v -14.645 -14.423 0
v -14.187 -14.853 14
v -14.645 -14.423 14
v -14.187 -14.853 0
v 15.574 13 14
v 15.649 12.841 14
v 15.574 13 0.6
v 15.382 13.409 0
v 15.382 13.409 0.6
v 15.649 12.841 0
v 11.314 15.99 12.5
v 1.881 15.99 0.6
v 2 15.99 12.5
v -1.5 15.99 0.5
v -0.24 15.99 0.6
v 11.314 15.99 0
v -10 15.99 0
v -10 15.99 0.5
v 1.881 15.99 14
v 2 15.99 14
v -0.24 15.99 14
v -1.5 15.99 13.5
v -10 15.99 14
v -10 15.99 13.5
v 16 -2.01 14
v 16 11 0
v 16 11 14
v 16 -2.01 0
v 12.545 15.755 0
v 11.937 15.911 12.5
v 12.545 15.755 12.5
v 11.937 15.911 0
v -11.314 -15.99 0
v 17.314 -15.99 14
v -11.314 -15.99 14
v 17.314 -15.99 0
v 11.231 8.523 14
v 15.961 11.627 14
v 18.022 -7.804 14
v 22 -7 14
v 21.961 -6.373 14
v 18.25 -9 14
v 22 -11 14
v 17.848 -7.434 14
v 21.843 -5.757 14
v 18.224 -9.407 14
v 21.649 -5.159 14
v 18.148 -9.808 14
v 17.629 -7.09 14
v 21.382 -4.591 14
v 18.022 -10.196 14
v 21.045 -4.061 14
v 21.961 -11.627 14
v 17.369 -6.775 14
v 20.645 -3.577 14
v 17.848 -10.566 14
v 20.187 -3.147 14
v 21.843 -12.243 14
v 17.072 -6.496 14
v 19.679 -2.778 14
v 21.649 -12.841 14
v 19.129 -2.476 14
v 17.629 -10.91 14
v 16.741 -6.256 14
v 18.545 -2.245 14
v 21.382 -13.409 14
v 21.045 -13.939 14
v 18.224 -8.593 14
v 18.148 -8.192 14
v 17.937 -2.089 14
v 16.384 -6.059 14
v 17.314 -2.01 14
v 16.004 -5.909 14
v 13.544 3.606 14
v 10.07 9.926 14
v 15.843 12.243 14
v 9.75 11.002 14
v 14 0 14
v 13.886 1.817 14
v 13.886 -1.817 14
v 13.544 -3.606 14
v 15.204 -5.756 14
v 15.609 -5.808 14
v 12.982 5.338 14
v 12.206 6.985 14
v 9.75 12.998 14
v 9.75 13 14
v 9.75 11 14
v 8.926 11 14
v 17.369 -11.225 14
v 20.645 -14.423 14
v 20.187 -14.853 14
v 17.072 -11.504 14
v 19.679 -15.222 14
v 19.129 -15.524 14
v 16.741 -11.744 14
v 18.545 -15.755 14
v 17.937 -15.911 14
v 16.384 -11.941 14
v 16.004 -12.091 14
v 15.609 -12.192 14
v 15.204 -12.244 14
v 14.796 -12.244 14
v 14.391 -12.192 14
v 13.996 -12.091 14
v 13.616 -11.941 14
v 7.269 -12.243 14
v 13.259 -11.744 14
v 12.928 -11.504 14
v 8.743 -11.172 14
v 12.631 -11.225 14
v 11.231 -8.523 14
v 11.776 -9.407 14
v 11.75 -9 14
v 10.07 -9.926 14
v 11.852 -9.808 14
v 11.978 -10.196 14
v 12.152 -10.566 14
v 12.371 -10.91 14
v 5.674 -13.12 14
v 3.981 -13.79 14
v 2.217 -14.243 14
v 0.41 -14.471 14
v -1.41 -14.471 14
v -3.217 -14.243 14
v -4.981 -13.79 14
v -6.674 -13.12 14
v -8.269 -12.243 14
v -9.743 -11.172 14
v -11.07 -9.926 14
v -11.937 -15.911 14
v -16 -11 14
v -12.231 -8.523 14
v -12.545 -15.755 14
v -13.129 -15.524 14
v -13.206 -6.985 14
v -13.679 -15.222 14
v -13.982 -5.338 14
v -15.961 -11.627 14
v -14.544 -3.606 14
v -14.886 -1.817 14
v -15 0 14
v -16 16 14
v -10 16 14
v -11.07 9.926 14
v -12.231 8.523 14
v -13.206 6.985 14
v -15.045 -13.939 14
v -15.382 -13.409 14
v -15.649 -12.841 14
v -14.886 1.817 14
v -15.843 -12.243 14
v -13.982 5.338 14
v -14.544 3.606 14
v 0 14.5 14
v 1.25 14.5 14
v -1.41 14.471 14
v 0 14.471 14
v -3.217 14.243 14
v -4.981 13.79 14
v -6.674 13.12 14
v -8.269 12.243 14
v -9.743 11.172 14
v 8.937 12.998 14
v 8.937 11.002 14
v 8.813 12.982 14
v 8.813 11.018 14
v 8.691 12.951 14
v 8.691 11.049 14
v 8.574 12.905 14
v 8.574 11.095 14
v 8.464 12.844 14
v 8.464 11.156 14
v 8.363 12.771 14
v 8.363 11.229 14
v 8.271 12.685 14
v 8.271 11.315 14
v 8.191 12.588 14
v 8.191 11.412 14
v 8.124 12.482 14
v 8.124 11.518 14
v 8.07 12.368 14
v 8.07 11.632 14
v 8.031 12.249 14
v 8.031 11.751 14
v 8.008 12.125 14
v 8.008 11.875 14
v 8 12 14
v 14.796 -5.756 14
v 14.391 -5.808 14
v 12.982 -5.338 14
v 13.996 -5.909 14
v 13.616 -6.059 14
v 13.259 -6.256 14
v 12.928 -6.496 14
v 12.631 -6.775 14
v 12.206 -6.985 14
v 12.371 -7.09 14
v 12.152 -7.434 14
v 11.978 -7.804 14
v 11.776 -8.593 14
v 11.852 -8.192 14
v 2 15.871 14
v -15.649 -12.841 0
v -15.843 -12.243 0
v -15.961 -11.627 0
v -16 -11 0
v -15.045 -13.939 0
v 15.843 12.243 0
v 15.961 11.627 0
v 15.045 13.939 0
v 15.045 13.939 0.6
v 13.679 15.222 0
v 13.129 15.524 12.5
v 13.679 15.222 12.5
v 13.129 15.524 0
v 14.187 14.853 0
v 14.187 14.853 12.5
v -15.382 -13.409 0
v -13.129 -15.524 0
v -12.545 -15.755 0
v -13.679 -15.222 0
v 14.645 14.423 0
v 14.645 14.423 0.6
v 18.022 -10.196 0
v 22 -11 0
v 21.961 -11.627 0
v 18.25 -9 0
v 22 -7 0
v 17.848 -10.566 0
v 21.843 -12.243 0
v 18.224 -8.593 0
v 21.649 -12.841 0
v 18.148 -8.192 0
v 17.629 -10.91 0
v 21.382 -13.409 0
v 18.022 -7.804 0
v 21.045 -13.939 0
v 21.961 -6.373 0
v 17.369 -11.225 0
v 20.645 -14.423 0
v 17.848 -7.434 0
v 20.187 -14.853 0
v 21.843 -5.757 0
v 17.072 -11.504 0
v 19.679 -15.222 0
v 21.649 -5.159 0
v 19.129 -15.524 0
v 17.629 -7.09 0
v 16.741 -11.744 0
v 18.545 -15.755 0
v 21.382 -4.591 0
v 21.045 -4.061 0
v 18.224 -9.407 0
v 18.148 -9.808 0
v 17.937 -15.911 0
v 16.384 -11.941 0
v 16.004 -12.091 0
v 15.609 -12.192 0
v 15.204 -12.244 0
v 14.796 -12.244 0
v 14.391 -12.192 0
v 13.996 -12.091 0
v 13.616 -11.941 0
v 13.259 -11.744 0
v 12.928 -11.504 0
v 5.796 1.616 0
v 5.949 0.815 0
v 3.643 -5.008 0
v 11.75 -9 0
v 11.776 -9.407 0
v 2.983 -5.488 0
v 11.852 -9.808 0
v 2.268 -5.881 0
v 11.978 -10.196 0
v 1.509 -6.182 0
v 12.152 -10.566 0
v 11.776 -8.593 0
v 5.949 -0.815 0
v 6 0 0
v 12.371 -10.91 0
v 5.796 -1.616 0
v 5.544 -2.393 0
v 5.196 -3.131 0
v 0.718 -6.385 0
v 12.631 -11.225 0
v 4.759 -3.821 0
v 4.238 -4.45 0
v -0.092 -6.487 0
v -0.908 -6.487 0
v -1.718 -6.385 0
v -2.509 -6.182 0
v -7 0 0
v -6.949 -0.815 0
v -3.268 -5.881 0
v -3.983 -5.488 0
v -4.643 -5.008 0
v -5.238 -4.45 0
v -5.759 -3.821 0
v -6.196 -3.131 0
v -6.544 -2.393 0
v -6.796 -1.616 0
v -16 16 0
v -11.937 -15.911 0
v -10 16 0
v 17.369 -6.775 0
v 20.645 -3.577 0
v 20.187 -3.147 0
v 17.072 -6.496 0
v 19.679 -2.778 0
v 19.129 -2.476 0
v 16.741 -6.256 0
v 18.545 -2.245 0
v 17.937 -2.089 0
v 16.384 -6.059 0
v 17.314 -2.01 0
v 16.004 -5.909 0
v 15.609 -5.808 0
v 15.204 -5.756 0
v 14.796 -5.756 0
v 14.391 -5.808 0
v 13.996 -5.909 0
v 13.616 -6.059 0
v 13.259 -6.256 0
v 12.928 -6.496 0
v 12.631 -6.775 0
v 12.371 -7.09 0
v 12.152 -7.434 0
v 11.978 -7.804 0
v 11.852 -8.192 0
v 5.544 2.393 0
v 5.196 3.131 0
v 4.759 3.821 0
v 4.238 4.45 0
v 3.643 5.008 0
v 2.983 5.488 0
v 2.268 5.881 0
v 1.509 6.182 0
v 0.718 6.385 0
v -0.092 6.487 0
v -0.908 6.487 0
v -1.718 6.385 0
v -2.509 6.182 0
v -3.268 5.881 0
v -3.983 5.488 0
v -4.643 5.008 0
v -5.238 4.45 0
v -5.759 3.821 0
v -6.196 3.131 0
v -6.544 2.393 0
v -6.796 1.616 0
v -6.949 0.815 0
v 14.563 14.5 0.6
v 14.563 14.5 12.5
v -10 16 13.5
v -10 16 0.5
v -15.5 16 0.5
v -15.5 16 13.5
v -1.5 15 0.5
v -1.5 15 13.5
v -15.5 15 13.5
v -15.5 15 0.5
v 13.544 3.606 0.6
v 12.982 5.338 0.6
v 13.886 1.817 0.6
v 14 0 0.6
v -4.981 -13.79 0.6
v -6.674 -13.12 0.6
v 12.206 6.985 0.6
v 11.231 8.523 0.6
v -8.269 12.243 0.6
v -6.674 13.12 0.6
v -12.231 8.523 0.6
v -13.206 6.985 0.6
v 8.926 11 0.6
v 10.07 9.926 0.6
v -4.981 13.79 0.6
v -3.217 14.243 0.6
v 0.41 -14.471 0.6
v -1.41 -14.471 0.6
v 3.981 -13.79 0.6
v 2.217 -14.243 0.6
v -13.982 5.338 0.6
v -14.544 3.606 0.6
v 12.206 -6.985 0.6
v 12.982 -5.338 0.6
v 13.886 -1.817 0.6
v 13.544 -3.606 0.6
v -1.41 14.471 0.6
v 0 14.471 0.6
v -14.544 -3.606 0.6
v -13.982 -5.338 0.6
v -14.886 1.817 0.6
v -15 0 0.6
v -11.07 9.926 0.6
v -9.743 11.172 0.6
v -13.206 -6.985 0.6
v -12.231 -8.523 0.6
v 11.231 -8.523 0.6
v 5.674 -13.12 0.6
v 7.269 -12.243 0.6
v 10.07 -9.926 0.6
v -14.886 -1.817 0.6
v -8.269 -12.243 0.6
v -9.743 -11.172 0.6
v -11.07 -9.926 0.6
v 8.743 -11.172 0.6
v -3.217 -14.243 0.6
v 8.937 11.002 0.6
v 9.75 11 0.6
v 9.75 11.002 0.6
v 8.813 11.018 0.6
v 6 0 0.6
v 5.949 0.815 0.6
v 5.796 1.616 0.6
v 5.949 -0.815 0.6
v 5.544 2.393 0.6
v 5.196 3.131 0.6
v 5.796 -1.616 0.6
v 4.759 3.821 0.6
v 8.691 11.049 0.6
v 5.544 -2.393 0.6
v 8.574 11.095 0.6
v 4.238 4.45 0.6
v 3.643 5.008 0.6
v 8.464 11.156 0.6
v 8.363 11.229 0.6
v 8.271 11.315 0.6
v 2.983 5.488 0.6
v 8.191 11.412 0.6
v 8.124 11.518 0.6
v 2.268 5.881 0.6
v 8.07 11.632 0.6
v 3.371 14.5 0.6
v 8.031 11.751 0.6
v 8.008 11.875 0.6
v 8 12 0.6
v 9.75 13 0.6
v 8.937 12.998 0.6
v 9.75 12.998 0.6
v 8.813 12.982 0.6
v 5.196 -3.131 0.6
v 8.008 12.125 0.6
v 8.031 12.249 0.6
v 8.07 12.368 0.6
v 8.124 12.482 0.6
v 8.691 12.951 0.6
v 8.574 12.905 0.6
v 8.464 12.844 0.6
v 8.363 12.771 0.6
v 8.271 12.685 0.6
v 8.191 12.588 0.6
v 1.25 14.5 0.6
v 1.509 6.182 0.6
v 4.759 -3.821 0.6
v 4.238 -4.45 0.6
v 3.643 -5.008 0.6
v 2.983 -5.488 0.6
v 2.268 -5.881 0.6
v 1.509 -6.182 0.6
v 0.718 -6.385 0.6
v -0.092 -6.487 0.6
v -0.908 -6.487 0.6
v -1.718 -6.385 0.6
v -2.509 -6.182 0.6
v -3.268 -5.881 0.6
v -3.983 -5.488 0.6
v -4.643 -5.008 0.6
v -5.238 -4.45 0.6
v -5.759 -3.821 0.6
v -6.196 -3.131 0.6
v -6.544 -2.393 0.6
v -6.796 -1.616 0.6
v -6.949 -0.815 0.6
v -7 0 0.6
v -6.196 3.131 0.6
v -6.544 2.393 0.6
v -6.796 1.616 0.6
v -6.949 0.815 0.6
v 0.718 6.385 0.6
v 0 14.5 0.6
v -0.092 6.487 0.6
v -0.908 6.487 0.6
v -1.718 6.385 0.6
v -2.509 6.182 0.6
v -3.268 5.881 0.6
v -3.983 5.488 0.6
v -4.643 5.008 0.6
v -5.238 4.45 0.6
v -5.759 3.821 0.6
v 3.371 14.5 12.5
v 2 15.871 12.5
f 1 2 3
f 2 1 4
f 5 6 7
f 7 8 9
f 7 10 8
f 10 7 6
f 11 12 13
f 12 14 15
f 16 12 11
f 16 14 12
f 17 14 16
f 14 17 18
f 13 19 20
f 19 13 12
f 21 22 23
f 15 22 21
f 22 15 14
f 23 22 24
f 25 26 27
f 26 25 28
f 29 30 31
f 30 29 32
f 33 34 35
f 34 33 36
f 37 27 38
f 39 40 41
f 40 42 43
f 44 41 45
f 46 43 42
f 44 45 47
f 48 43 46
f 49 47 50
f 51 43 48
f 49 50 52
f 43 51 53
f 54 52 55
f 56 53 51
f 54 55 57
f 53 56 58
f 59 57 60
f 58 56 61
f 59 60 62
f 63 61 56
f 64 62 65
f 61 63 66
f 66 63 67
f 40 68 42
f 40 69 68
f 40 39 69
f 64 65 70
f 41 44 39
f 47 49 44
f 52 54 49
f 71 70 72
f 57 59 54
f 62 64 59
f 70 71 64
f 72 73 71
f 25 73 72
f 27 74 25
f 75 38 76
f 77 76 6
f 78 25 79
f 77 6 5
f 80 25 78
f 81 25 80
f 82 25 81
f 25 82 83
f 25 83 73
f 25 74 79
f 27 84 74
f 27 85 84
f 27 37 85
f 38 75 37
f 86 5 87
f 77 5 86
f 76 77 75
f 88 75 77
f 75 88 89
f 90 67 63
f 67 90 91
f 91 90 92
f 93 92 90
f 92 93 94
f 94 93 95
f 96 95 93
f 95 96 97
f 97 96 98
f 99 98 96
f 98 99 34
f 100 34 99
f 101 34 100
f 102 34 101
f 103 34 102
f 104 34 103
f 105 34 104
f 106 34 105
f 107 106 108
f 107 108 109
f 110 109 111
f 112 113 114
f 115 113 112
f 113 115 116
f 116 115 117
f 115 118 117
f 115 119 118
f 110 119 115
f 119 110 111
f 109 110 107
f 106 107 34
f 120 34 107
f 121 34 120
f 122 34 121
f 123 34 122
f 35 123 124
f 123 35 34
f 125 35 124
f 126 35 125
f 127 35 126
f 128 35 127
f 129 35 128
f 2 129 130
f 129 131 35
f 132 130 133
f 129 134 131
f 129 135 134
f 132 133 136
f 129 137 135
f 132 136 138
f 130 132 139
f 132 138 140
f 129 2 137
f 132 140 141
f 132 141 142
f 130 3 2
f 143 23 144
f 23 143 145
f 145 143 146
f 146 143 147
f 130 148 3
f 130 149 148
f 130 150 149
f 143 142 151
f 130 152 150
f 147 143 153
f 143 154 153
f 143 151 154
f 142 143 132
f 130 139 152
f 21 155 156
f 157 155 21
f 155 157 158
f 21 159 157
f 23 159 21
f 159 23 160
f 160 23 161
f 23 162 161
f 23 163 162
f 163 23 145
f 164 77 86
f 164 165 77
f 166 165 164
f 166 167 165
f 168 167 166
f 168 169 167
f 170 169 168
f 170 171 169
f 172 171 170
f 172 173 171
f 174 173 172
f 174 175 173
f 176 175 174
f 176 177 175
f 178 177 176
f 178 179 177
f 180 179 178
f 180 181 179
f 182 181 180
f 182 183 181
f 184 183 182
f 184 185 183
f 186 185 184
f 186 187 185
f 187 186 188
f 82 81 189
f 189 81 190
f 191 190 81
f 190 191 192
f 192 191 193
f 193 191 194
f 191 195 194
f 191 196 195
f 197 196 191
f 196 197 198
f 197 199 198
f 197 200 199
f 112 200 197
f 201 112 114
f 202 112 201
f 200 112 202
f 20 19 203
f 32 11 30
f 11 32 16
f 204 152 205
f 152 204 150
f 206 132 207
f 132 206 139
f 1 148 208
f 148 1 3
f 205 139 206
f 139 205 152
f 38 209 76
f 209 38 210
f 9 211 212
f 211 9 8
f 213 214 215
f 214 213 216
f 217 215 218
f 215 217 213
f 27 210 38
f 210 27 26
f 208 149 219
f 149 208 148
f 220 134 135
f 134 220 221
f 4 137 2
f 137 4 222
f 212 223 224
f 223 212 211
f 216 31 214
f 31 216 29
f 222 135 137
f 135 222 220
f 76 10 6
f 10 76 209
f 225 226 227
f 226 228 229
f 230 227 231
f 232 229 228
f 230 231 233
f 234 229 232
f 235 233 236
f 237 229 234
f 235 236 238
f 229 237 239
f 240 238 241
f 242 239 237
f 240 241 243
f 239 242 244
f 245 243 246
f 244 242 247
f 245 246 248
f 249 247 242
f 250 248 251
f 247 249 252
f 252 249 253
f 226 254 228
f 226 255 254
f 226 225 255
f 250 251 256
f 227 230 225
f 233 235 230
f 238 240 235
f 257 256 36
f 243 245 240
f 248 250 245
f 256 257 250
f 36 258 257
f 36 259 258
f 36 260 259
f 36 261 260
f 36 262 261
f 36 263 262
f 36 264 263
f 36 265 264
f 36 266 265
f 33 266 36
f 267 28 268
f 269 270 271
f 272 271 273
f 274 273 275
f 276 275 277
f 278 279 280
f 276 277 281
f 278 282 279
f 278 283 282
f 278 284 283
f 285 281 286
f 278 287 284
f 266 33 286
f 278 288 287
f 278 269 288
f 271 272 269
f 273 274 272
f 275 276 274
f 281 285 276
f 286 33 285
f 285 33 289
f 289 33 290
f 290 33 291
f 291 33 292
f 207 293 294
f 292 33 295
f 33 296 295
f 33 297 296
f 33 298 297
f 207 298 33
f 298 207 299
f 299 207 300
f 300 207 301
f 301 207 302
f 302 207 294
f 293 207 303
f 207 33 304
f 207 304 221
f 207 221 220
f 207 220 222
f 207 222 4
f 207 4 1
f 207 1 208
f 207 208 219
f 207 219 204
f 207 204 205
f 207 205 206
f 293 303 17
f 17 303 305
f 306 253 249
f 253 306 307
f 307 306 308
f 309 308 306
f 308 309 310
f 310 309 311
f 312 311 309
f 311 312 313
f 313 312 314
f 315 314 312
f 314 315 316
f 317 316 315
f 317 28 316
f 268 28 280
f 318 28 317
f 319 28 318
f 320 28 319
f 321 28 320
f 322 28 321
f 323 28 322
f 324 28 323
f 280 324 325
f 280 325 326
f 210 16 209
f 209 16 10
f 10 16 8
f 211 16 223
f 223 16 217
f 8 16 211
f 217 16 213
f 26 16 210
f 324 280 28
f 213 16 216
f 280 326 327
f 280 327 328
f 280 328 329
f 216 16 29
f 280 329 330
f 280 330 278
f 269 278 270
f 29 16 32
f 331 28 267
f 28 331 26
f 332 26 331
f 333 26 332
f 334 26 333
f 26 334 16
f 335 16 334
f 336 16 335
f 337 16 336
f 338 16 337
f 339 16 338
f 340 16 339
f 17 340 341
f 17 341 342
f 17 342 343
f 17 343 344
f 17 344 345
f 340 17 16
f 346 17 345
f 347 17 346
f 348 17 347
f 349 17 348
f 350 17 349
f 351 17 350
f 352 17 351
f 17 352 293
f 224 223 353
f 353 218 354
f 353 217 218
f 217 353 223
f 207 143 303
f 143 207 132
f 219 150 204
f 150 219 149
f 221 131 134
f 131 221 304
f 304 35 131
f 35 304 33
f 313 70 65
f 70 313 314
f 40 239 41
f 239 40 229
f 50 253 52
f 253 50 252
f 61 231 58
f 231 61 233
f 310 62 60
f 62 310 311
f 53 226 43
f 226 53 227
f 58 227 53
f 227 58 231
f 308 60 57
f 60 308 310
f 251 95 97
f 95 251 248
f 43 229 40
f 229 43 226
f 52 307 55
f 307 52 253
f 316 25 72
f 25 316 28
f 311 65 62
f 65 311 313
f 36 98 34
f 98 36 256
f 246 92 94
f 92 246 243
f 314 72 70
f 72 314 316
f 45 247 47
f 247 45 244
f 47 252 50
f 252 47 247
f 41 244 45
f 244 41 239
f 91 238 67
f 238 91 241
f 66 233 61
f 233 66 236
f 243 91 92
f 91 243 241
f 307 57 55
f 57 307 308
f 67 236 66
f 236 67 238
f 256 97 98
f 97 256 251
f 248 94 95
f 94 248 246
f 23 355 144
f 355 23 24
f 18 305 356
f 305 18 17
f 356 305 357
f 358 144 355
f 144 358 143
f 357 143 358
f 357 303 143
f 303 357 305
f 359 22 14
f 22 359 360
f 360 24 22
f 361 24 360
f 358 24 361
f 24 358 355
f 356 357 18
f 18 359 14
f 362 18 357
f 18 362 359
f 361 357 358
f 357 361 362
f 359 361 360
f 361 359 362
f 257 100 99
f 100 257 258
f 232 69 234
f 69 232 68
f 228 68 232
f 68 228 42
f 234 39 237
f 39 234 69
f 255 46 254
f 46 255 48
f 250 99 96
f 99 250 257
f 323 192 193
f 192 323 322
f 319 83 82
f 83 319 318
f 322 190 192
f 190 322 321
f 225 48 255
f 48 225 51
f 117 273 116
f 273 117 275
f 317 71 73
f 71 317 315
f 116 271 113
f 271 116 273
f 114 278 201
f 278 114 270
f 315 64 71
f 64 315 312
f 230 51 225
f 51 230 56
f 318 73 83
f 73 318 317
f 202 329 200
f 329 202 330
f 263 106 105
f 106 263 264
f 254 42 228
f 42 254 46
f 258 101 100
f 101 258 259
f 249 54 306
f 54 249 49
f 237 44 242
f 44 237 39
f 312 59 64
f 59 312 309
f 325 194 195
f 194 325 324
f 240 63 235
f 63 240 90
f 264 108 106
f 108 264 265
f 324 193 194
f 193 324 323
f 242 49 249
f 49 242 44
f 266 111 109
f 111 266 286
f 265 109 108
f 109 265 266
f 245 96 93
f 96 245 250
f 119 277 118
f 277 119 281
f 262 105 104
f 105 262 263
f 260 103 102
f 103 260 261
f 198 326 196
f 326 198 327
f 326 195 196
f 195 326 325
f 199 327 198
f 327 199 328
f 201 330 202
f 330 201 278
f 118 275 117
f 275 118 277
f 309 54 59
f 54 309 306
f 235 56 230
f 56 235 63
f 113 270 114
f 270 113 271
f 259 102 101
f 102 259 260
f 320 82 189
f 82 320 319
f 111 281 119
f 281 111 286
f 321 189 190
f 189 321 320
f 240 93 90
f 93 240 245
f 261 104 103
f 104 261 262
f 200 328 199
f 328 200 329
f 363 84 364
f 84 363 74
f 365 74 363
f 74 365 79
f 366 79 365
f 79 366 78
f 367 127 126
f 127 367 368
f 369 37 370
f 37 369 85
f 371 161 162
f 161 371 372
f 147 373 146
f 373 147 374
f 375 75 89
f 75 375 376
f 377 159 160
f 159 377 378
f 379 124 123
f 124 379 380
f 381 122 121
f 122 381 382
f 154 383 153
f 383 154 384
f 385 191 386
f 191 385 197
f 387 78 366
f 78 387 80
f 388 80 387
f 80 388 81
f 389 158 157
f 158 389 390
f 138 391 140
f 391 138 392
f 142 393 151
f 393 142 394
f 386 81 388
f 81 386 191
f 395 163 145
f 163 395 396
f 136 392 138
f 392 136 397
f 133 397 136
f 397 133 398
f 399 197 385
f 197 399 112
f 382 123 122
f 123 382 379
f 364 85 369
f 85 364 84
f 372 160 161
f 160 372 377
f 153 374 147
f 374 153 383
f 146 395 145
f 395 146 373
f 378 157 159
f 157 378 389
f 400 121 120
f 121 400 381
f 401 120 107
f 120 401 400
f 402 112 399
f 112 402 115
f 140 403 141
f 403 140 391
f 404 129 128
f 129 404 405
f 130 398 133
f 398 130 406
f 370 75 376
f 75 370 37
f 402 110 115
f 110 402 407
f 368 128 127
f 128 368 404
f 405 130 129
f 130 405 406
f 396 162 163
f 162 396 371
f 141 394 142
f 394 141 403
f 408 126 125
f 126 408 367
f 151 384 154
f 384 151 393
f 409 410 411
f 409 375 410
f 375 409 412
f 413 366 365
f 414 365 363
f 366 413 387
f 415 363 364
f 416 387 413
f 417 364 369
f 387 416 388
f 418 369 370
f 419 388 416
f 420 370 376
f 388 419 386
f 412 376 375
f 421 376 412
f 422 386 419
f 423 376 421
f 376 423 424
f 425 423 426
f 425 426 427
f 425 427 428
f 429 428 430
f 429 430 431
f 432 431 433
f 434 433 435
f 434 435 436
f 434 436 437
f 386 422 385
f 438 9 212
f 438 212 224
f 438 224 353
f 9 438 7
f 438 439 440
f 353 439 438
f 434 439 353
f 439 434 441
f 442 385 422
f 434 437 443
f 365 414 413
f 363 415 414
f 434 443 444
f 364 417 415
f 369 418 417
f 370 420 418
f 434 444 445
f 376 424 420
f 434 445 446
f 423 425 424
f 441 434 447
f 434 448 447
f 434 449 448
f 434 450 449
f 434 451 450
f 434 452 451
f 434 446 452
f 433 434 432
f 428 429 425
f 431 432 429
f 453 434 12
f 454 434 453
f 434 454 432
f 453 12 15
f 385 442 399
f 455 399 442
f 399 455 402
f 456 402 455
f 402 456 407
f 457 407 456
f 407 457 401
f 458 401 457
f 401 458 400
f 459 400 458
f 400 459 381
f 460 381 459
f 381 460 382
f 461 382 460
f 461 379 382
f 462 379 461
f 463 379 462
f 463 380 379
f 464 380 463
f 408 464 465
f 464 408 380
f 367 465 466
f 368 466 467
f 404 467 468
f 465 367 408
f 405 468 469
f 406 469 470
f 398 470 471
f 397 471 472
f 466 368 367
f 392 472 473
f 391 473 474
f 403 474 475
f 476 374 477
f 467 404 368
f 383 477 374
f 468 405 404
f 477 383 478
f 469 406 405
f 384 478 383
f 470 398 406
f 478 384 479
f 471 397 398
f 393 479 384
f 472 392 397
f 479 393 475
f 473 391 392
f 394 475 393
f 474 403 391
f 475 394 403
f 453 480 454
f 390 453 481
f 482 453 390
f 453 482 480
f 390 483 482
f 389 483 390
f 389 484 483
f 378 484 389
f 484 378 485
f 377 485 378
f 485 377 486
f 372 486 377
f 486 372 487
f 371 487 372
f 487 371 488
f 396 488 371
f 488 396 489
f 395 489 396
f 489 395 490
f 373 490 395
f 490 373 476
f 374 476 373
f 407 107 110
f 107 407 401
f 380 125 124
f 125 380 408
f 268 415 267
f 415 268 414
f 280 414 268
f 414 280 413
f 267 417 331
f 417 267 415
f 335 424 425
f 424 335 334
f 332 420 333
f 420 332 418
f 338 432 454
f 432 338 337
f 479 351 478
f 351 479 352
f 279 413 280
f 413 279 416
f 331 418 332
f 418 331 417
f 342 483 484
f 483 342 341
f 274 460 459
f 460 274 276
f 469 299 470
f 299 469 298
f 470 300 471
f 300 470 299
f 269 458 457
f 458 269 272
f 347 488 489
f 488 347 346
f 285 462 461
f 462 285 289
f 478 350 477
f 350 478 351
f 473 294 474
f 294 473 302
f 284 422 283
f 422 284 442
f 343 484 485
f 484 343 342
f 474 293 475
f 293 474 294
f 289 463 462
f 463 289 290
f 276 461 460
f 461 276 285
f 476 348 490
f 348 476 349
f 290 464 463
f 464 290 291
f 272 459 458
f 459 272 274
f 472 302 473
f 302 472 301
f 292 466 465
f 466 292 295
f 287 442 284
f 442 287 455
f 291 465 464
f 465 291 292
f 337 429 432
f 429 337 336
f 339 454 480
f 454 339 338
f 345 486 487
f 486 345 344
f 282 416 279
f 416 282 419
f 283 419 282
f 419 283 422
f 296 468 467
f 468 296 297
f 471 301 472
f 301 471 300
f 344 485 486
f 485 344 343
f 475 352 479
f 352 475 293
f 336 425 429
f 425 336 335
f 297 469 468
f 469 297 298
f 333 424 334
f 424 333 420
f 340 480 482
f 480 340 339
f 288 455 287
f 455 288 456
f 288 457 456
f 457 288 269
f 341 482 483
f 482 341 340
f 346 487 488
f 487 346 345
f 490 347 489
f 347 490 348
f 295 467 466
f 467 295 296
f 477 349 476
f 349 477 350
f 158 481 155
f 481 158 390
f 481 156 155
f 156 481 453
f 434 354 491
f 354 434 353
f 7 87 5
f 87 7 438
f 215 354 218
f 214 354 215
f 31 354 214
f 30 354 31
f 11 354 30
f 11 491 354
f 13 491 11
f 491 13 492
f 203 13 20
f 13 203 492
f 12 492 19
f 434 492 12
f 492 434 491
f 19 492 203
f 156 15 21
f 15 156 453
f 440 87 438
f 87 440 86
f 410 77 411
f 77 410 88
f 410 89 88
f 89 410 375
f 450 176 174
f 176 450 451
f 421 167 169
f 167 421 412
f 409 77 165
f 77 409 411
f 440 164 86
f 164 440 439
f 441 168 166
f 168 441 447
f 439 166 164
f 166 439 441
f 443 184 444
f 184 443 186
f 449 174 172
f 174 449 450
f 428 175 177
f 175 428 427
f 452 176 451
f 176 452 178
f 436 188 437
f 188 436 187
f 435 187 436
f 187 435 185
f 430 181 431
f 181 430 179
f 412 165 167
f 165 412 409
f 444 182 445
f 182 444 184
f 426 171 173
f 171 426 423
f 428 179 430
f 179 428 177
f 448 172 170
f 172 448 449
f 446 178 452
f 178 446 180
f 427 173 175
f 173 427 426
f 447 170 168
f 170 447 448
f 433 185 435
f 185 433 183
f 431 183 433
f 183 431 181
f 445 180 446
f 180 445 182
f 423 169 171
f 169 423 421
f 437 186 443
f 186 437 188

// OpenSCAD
$fn = 50;


union() {
	difference() {
		union() {
			translate(v = [0, 0, 0]) {
				rotate(a = [0, 0, 0]) {
					hull() {
						translate(v = [-11.0000000000, 11.0000000000, 0]) {
							rotate(a = [0, 0, 0]) {
								translate(v = [0, 0, 0]) {
									rotate(a = [0, 0, 0]) {
										cylinder(h = 14, r = 5);
									}
								}
							}
						}
						translate(v = [11.0000000000, 11.0000000000, 0]) {
							rotate(a = [0, 0, 0]) {
								translate(v = [0, 0, 0]) {
									rotate(a = [0, 0, 0]) {
										cylinder(h = 14, r = 5);
									}
								}
							}
						}
						translate(v = [-11.0000000000, -11.0000000000, 0]) {
							rotate(a = [0, 0, 0]) {
								translate(v = [0, 0, 0]) {
									rotate(a = [0, 0, 0]) {
										cylinder(h = 14, r = 5);
									}
								}
							}
						}
						translate(v = [11.0000000000, -11.0000000000, 0]) {
							rotate(a = [0, 0, 0]) {
								translate(v = [0, 0, 0]) {
									rotate(a = [0, 0, 0]) {
										cylinder(h = 14, r = 5);
									}
								}
							}
						}
					}
				}
			}
			translate(v = [7.5000000000, -9.0000000000, 0]) {
				rotate(a = [0, 0, 0]) {
					hull() {
						translate(v = [-9.5000000000, 2.0000000000, 0]) {
							rotate(a = [0, 0, 0]) {
								translate(v = [0, 0, 0]) {
									rotate(a = [0, 0, 0]) {
										cylinder(h = 14, r = 5);
									}
								}
							}
						}
						translate(v = [9.5000000000, 2.0000000000, 0]) {
							rotate(a = [0, 0, 0]) {
								translate(v = [0, 0, 0]) {
									rotate(a = [0, 0, 0]) {
										cylinder(h = 14, r = 5);
									}
								}
							}
						}
						translate(v = [-9.5000000000, -2.0000000000, 0]) {
							rotate(a = [0, 0, 0]) {
								translate(v = [0, 0, 0]) {
									rotate(a = [0, 0, 0]) {
										cylinder(h = 14, r = 5);
									}
								}
							}
						}
						translate(v = [9.5000000000, -2.0000000000, 0]) {
							rotate(a = [0, 0, 0]) {
								translate(v = [0, 0, 0]) {
									rotate(a = [0, 0, 0]) {
										cylinder(h = 14, r = 5);
									}
								}
							}
						}
					}
				}
			}
			translate(v = [-16.0000000000, 10.0000000000, 0]) {
				rotate(a = [0, 0, 0]) {
					cube(size = [6, 6, 14]);
				}
			}
		}
		union() {
			translate(v = [-15.5000000000, 15.0000000000, 0.5000000000]) {
				rotate(a = [0, 0, 0]) {
					cube(size = [14, 1, 13.0000000000]);
				}
			}
			translate(v = [15.0000000000, -9.0000000000, -125.0000000000]) {
				rotate(a = [0, 0, 0]) {
					cylinder(h = 250, r = 3.2500000000);
				}
			}
			translate(v = [-0.5000000000, 0.0000000000, 0.6000000000]) {
				rotate(a = [0, 0, 0]) {
					cylinder(h = 16.4000000000, r = 14.5000000000);
				}
			}
			translate(v = [-0.5000000000, 0.0000000000, -7.0000000000]) {
				rotate(a = [0, 0, 0]) {
					cylinder(h = 14, r = 6.5000000000);
				}
			}
			translate(v = [0.0000000000, 13.0000000000, 0.6000000000]) {
				rotate(a = [0, 0, 0]) {
					cube(size = [16.0000000000, 1.5000000000, 16.4000000000]);
				}
			}
			translate(v = [2.0000000000, 13.0000000000, 12.5000000000]) {
				rotate(a = [0, 0, 0]) {
					cube(size = [14.0000000000, 4.5000000000, 1.5000000000]);
				}
			}
			translate(v = [-3.0000000000, 18.7500000000, 0.6000000000]) {
				rotate(a = [0, 0, -45]) {
					cube(size = [10, 1.5000000000, 16.4000000000]);
				}
			}
			translate(v = [2.2500000000, 11.0000000000, 0.6000000000]) {
				rotate(a = [0, 0, 0]) {
					cube(size = [7.5000000000, 2, 13.4000000000]);
				}
			}
		}
	}
	union() {
		translate(v = [11.5000000000, 12, 0]) {
			rotate(a = [0, 0, 0]) {
				hull() {
					translate(v = [2.5000000000, 0, 0]) {
						rotate(a = [0, 0, 0]) {
							translate(v = [0, 0, 0]) {
								rotate(a = [0, 0, 0]) {
									cylinder(h = 14, r = 1.0000000000);
								}
							}
						}
					}
					translate(v = [-2.5000000000, 0, 0]) {
						rotate(a = [0, 0, 0]) {
							translate(v = [0, 0, 0]) {
								rotate(a = [0, 0, 0]) {
									cylinder(h = 14, r = 1.0000000000);
								}
							}
						}
					}
				}
			}
		}
	}
}
